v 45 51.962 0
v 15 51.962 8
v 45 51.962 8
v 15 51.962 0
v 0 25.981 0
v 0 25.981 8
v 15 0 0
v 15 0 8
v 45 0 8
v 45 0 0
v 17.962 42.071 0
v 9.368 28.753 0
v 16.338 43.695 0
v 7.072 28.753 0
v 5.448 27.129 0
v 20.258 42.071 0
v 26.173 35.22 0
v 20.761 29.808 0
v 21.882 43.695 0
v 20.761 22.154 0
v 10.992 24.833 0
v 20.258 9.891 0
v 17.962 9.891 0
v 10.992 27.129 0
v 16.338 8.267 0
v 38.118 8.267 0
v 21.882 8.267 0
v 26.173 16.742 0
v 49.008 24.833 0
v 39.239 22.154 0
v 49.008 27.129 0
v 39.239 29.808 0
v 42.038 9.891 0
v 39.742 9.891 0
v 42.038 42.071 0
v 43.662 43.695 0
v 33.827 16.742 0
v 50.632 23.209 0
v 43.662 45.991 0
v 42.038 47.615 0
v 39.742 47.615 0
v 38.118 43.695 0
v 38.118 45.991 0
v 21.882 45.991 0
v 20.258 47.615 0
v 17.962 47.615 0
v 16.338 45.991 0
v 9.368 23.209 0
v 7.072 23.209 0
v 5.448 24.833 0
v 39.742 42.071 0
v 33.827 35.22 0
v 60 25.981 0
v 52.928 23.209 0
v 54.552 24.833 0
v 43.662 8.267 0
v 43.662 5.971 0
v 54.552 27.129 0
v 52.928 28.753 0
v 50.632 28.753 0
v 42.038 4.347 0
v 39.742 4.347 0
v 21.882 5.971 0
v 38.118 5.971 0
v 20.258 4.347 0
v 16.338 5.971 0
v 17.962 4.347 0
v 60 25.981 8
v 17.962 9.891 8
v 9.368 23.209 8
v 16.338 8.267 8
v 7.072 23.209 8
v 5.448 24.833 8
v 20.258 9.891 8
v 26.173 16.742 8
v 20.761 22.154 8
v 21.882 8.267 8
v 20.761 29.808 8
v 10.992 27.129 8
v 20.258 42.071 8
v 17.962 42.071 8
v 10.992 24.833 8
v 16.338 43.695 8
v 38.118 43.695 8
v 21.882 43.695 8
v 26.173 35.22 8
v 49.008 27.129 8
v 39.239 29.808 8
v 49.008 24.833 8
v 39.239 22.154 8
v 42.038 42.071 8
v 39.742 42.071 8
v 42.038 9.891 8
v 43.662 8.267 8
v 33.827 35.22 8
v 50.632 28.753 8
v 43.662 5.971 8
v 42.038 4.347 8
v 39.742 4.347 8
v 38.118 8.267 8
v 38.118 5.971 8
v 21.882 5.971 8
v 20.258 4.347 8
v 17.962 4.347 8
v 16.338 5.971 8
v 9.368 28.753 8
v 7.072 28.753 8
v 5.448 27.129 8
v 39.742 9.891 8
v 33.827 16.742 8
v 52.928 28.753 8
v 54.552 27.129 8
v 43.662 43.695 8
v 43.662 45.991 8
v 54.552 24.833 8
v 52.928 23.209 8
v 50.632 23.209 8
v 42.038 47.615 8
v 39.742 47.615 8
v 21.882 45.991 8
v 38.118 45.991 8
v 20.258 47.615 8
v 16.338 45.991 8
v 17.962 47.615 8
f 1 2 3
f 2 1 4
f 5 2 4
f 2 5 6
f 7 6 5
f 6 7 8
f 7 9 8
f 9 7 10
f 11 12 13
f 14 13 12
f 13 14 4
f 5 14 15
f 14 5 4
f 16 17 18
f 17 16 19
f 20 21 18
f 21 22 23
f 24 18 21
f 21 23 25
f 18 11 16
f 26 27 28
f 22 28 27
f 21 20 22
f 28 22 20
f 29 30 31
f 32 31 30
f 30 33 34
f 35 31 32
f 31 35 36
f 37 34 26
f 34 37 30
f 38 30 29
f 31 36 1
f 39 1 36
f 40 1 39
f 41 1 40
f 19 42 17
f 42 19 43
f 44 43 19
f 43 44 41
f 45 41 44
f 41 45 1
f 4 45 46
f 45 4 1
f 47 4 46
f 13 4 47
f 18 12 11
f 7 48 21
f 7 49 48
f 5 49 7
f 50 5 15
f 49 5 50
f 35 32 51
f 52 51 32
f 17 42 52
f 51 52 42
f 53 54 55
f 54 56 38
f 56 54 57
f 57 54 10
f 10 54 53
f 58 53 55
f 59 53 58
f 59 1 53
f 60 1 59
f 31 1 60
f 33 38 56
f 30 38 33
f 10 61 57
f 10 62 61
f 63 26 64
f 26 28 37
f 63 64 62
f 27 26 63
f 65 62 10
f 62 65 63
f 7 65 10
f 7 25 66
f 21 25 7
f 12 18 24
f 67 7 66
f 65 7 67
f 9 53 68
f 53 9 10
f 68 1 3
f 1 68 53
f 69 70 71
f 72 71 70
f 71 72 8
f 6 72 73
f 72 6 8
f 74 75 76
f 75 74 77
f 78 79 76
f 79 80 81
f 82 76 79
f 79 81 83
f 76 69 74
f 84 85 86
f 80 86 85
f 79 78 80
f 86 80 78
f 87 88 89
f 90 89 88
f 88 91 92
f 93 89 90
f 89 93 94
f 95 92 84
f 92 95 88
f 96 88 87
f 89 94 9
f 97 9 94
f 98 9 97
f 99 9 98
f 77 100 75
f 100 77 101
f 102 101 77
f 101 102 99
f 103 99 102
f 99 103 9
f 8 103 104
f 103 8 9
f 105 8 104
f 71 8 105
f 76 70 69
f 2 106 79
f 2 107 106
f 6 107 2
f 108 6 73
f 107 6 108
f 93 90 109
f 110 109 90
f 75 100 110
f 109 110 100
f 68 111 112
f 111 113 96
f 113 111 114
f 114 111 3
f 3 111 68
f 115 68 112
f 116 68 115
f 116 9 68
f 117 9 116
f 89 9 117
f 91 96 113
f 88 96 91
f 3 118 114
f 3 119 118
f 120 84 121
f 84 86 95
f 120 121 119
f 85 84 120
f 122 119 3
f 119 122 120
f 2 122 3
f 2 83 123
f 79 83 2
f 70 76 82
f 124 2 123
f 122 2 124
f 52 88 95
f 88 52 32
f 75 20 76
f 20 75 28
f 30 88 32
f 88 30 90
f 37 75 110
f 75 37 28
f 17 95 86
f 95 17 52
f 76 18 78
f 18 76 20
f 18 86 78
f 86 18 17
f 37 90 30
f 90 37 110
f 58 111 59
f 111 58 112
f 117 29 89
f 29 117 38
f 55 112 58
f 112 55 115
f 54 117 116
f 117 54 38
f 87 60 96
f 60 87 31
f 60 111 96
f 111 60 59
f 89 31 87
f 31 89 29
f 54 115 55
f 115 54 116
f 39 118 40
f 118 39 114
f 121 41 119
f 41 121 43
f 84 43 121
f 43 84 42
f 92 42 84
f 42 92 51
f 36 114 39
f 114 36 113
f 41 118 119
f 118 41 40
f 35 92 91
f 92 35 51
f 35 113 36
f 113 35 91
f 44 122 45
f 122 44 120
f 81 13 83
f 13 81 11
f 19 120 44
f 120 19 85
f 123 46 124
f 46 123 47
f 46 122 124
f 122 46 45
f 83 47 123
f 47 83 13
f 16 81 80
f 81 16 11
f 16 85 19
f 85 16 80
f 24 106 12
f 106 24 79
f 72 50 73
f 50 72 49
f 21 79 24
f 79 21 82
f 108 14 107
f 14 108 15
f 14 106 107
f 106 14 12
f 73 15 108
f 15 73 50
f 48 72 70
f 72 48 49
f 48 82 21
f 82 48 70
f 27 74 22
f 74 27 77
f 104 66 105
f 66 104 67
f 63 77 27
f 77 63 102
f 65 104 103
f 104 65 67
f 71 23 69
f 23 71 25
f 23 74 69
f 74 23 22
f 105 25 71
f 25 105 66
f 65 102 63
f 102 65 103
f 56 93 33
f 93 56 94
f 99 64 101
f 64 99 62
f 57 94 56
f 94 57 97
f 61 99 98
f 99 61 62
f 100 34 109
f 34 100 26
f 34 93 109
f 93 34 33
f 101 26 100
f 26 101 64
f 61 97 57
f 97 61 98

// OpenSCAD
$fn = 32;

// ----------------------------------------------------------------------
// Polygon plate: 6-gon R30, 6 bolt windows
// ----------------------------------------------------------------------

// --- parameters (mm) ---
sides = 6;                // number of polygon sides
plate_r = 30;             // circumscribed radius of the polygon
bore_r = 10;              // centre bore radius
bolts = 6;                // number of bolt windows
ring_r = 21.78;           // bolt-circle radius
bolt_r = 3;               // bolt window radius
plate_t = 8;              // plate thickness, Z (extrusion height)

plate_d = 2 * plate_r;  // circumscribed diameter
bore_d = 2 * bore_r;  // centre bore diameter
bolt_d = 2 * bolt_r;  // bolt window diameter
ring_d = 2 * ring_r;  // bolt-circle diameter

profile = [[60, 25.981], [45, 51.962], [15, 51.962], [0, 25.981], [15, 0], [45, 0]];  // primary outline, 6 points, counter clockwise
void_1 = [[39.239, 29.808], [33.827, 35.22], [26.173, 35.22], [20.761, 29.808], [20.761, 22.154], [26.173, 16.742], [33.827, 16.742], [39.239, 22.154]];  // centre bore, 8 points
void_2 = [[54.552, 27.129], [52.928, 28.753], [50.632, 28.753], [49.008, 27.129], [49.008, 24.833], [50.632, 23.209], [52.928, 23.209], [54.552, 24.833]];  // bolt window 1, 8 points
void_3 = [[43.662, 45.991], [42.038, 47.615], [39.742, 47.615], [38.118, 45.991], [38.118, 43.695], [39.742, 42.071], [42.038, 42.071], [43.662, 43.695]];  // bolt window 2, 8 points
void_4 = [[21.882, 45.991], [20.258, 47.615], [17.962, 47.615], [16.338, 45.991], [16.338, 43.695], [17.962, 42.071], [20.258, 42.071], [21.882, 43.695]];  // bolt window 3, 8 points
void_5 = [[10.992, 27.129], [9.368, 28.753], [7.072, 28.753], [5.448, 27.129], [5.448, 24.833], [7.072, 23.209], [9.368, 23.209], [10.992, 24.833]];  // bolt window 4, 8 points
void_6 = [[21.882, 8.267], [20.258, 9.891], [17.962, 9.891], [16.338, 8.267], [16.338, 5.971], [17.962, 4.347], [20.258, 4.347], [21.882, 5.971]];  // bolt window 5, 8 points
void_7 = [[43.662, 8.267], [42.038, 9.891], [39.742, 9.891], [38.118, 8.267], [38.118, 5.971], [39.742, 4.347], [42.038, 4.347], [43.662, 5.971]];  // bolt window 6, 8 points

// --- the one profile operation ---
difference() {
  linear_extrude(height = plate_t) polygon(points = profile);
  translate([0, 0, -1])
    linear_extrude(height = plate_t + 2) polygon(points = void_1);
  translate([0, 0, -1])
    linear_extrude(height = plate_t + 2) polygon(points = void_2);
  translate([0, 0, -1])
    linear_extrude(height = plate_t + 2) polygon(points = void_3);
  translate([0, 0, -1])
    linear_extrude(height = plate_t + 2) polygon(points = void_4);
  translate([0, 0, -1])
    linear_extrude(height = plate_t + 2) polygon(points = void_5);
  translate([0, 0, -1])
    linear_extrude(height = plate_t + 2) polygon(points = void_6);
  translate([0, 0, -1])
    linear_extrude(height = plate_t + 2) polygon(points = void_7);
}
